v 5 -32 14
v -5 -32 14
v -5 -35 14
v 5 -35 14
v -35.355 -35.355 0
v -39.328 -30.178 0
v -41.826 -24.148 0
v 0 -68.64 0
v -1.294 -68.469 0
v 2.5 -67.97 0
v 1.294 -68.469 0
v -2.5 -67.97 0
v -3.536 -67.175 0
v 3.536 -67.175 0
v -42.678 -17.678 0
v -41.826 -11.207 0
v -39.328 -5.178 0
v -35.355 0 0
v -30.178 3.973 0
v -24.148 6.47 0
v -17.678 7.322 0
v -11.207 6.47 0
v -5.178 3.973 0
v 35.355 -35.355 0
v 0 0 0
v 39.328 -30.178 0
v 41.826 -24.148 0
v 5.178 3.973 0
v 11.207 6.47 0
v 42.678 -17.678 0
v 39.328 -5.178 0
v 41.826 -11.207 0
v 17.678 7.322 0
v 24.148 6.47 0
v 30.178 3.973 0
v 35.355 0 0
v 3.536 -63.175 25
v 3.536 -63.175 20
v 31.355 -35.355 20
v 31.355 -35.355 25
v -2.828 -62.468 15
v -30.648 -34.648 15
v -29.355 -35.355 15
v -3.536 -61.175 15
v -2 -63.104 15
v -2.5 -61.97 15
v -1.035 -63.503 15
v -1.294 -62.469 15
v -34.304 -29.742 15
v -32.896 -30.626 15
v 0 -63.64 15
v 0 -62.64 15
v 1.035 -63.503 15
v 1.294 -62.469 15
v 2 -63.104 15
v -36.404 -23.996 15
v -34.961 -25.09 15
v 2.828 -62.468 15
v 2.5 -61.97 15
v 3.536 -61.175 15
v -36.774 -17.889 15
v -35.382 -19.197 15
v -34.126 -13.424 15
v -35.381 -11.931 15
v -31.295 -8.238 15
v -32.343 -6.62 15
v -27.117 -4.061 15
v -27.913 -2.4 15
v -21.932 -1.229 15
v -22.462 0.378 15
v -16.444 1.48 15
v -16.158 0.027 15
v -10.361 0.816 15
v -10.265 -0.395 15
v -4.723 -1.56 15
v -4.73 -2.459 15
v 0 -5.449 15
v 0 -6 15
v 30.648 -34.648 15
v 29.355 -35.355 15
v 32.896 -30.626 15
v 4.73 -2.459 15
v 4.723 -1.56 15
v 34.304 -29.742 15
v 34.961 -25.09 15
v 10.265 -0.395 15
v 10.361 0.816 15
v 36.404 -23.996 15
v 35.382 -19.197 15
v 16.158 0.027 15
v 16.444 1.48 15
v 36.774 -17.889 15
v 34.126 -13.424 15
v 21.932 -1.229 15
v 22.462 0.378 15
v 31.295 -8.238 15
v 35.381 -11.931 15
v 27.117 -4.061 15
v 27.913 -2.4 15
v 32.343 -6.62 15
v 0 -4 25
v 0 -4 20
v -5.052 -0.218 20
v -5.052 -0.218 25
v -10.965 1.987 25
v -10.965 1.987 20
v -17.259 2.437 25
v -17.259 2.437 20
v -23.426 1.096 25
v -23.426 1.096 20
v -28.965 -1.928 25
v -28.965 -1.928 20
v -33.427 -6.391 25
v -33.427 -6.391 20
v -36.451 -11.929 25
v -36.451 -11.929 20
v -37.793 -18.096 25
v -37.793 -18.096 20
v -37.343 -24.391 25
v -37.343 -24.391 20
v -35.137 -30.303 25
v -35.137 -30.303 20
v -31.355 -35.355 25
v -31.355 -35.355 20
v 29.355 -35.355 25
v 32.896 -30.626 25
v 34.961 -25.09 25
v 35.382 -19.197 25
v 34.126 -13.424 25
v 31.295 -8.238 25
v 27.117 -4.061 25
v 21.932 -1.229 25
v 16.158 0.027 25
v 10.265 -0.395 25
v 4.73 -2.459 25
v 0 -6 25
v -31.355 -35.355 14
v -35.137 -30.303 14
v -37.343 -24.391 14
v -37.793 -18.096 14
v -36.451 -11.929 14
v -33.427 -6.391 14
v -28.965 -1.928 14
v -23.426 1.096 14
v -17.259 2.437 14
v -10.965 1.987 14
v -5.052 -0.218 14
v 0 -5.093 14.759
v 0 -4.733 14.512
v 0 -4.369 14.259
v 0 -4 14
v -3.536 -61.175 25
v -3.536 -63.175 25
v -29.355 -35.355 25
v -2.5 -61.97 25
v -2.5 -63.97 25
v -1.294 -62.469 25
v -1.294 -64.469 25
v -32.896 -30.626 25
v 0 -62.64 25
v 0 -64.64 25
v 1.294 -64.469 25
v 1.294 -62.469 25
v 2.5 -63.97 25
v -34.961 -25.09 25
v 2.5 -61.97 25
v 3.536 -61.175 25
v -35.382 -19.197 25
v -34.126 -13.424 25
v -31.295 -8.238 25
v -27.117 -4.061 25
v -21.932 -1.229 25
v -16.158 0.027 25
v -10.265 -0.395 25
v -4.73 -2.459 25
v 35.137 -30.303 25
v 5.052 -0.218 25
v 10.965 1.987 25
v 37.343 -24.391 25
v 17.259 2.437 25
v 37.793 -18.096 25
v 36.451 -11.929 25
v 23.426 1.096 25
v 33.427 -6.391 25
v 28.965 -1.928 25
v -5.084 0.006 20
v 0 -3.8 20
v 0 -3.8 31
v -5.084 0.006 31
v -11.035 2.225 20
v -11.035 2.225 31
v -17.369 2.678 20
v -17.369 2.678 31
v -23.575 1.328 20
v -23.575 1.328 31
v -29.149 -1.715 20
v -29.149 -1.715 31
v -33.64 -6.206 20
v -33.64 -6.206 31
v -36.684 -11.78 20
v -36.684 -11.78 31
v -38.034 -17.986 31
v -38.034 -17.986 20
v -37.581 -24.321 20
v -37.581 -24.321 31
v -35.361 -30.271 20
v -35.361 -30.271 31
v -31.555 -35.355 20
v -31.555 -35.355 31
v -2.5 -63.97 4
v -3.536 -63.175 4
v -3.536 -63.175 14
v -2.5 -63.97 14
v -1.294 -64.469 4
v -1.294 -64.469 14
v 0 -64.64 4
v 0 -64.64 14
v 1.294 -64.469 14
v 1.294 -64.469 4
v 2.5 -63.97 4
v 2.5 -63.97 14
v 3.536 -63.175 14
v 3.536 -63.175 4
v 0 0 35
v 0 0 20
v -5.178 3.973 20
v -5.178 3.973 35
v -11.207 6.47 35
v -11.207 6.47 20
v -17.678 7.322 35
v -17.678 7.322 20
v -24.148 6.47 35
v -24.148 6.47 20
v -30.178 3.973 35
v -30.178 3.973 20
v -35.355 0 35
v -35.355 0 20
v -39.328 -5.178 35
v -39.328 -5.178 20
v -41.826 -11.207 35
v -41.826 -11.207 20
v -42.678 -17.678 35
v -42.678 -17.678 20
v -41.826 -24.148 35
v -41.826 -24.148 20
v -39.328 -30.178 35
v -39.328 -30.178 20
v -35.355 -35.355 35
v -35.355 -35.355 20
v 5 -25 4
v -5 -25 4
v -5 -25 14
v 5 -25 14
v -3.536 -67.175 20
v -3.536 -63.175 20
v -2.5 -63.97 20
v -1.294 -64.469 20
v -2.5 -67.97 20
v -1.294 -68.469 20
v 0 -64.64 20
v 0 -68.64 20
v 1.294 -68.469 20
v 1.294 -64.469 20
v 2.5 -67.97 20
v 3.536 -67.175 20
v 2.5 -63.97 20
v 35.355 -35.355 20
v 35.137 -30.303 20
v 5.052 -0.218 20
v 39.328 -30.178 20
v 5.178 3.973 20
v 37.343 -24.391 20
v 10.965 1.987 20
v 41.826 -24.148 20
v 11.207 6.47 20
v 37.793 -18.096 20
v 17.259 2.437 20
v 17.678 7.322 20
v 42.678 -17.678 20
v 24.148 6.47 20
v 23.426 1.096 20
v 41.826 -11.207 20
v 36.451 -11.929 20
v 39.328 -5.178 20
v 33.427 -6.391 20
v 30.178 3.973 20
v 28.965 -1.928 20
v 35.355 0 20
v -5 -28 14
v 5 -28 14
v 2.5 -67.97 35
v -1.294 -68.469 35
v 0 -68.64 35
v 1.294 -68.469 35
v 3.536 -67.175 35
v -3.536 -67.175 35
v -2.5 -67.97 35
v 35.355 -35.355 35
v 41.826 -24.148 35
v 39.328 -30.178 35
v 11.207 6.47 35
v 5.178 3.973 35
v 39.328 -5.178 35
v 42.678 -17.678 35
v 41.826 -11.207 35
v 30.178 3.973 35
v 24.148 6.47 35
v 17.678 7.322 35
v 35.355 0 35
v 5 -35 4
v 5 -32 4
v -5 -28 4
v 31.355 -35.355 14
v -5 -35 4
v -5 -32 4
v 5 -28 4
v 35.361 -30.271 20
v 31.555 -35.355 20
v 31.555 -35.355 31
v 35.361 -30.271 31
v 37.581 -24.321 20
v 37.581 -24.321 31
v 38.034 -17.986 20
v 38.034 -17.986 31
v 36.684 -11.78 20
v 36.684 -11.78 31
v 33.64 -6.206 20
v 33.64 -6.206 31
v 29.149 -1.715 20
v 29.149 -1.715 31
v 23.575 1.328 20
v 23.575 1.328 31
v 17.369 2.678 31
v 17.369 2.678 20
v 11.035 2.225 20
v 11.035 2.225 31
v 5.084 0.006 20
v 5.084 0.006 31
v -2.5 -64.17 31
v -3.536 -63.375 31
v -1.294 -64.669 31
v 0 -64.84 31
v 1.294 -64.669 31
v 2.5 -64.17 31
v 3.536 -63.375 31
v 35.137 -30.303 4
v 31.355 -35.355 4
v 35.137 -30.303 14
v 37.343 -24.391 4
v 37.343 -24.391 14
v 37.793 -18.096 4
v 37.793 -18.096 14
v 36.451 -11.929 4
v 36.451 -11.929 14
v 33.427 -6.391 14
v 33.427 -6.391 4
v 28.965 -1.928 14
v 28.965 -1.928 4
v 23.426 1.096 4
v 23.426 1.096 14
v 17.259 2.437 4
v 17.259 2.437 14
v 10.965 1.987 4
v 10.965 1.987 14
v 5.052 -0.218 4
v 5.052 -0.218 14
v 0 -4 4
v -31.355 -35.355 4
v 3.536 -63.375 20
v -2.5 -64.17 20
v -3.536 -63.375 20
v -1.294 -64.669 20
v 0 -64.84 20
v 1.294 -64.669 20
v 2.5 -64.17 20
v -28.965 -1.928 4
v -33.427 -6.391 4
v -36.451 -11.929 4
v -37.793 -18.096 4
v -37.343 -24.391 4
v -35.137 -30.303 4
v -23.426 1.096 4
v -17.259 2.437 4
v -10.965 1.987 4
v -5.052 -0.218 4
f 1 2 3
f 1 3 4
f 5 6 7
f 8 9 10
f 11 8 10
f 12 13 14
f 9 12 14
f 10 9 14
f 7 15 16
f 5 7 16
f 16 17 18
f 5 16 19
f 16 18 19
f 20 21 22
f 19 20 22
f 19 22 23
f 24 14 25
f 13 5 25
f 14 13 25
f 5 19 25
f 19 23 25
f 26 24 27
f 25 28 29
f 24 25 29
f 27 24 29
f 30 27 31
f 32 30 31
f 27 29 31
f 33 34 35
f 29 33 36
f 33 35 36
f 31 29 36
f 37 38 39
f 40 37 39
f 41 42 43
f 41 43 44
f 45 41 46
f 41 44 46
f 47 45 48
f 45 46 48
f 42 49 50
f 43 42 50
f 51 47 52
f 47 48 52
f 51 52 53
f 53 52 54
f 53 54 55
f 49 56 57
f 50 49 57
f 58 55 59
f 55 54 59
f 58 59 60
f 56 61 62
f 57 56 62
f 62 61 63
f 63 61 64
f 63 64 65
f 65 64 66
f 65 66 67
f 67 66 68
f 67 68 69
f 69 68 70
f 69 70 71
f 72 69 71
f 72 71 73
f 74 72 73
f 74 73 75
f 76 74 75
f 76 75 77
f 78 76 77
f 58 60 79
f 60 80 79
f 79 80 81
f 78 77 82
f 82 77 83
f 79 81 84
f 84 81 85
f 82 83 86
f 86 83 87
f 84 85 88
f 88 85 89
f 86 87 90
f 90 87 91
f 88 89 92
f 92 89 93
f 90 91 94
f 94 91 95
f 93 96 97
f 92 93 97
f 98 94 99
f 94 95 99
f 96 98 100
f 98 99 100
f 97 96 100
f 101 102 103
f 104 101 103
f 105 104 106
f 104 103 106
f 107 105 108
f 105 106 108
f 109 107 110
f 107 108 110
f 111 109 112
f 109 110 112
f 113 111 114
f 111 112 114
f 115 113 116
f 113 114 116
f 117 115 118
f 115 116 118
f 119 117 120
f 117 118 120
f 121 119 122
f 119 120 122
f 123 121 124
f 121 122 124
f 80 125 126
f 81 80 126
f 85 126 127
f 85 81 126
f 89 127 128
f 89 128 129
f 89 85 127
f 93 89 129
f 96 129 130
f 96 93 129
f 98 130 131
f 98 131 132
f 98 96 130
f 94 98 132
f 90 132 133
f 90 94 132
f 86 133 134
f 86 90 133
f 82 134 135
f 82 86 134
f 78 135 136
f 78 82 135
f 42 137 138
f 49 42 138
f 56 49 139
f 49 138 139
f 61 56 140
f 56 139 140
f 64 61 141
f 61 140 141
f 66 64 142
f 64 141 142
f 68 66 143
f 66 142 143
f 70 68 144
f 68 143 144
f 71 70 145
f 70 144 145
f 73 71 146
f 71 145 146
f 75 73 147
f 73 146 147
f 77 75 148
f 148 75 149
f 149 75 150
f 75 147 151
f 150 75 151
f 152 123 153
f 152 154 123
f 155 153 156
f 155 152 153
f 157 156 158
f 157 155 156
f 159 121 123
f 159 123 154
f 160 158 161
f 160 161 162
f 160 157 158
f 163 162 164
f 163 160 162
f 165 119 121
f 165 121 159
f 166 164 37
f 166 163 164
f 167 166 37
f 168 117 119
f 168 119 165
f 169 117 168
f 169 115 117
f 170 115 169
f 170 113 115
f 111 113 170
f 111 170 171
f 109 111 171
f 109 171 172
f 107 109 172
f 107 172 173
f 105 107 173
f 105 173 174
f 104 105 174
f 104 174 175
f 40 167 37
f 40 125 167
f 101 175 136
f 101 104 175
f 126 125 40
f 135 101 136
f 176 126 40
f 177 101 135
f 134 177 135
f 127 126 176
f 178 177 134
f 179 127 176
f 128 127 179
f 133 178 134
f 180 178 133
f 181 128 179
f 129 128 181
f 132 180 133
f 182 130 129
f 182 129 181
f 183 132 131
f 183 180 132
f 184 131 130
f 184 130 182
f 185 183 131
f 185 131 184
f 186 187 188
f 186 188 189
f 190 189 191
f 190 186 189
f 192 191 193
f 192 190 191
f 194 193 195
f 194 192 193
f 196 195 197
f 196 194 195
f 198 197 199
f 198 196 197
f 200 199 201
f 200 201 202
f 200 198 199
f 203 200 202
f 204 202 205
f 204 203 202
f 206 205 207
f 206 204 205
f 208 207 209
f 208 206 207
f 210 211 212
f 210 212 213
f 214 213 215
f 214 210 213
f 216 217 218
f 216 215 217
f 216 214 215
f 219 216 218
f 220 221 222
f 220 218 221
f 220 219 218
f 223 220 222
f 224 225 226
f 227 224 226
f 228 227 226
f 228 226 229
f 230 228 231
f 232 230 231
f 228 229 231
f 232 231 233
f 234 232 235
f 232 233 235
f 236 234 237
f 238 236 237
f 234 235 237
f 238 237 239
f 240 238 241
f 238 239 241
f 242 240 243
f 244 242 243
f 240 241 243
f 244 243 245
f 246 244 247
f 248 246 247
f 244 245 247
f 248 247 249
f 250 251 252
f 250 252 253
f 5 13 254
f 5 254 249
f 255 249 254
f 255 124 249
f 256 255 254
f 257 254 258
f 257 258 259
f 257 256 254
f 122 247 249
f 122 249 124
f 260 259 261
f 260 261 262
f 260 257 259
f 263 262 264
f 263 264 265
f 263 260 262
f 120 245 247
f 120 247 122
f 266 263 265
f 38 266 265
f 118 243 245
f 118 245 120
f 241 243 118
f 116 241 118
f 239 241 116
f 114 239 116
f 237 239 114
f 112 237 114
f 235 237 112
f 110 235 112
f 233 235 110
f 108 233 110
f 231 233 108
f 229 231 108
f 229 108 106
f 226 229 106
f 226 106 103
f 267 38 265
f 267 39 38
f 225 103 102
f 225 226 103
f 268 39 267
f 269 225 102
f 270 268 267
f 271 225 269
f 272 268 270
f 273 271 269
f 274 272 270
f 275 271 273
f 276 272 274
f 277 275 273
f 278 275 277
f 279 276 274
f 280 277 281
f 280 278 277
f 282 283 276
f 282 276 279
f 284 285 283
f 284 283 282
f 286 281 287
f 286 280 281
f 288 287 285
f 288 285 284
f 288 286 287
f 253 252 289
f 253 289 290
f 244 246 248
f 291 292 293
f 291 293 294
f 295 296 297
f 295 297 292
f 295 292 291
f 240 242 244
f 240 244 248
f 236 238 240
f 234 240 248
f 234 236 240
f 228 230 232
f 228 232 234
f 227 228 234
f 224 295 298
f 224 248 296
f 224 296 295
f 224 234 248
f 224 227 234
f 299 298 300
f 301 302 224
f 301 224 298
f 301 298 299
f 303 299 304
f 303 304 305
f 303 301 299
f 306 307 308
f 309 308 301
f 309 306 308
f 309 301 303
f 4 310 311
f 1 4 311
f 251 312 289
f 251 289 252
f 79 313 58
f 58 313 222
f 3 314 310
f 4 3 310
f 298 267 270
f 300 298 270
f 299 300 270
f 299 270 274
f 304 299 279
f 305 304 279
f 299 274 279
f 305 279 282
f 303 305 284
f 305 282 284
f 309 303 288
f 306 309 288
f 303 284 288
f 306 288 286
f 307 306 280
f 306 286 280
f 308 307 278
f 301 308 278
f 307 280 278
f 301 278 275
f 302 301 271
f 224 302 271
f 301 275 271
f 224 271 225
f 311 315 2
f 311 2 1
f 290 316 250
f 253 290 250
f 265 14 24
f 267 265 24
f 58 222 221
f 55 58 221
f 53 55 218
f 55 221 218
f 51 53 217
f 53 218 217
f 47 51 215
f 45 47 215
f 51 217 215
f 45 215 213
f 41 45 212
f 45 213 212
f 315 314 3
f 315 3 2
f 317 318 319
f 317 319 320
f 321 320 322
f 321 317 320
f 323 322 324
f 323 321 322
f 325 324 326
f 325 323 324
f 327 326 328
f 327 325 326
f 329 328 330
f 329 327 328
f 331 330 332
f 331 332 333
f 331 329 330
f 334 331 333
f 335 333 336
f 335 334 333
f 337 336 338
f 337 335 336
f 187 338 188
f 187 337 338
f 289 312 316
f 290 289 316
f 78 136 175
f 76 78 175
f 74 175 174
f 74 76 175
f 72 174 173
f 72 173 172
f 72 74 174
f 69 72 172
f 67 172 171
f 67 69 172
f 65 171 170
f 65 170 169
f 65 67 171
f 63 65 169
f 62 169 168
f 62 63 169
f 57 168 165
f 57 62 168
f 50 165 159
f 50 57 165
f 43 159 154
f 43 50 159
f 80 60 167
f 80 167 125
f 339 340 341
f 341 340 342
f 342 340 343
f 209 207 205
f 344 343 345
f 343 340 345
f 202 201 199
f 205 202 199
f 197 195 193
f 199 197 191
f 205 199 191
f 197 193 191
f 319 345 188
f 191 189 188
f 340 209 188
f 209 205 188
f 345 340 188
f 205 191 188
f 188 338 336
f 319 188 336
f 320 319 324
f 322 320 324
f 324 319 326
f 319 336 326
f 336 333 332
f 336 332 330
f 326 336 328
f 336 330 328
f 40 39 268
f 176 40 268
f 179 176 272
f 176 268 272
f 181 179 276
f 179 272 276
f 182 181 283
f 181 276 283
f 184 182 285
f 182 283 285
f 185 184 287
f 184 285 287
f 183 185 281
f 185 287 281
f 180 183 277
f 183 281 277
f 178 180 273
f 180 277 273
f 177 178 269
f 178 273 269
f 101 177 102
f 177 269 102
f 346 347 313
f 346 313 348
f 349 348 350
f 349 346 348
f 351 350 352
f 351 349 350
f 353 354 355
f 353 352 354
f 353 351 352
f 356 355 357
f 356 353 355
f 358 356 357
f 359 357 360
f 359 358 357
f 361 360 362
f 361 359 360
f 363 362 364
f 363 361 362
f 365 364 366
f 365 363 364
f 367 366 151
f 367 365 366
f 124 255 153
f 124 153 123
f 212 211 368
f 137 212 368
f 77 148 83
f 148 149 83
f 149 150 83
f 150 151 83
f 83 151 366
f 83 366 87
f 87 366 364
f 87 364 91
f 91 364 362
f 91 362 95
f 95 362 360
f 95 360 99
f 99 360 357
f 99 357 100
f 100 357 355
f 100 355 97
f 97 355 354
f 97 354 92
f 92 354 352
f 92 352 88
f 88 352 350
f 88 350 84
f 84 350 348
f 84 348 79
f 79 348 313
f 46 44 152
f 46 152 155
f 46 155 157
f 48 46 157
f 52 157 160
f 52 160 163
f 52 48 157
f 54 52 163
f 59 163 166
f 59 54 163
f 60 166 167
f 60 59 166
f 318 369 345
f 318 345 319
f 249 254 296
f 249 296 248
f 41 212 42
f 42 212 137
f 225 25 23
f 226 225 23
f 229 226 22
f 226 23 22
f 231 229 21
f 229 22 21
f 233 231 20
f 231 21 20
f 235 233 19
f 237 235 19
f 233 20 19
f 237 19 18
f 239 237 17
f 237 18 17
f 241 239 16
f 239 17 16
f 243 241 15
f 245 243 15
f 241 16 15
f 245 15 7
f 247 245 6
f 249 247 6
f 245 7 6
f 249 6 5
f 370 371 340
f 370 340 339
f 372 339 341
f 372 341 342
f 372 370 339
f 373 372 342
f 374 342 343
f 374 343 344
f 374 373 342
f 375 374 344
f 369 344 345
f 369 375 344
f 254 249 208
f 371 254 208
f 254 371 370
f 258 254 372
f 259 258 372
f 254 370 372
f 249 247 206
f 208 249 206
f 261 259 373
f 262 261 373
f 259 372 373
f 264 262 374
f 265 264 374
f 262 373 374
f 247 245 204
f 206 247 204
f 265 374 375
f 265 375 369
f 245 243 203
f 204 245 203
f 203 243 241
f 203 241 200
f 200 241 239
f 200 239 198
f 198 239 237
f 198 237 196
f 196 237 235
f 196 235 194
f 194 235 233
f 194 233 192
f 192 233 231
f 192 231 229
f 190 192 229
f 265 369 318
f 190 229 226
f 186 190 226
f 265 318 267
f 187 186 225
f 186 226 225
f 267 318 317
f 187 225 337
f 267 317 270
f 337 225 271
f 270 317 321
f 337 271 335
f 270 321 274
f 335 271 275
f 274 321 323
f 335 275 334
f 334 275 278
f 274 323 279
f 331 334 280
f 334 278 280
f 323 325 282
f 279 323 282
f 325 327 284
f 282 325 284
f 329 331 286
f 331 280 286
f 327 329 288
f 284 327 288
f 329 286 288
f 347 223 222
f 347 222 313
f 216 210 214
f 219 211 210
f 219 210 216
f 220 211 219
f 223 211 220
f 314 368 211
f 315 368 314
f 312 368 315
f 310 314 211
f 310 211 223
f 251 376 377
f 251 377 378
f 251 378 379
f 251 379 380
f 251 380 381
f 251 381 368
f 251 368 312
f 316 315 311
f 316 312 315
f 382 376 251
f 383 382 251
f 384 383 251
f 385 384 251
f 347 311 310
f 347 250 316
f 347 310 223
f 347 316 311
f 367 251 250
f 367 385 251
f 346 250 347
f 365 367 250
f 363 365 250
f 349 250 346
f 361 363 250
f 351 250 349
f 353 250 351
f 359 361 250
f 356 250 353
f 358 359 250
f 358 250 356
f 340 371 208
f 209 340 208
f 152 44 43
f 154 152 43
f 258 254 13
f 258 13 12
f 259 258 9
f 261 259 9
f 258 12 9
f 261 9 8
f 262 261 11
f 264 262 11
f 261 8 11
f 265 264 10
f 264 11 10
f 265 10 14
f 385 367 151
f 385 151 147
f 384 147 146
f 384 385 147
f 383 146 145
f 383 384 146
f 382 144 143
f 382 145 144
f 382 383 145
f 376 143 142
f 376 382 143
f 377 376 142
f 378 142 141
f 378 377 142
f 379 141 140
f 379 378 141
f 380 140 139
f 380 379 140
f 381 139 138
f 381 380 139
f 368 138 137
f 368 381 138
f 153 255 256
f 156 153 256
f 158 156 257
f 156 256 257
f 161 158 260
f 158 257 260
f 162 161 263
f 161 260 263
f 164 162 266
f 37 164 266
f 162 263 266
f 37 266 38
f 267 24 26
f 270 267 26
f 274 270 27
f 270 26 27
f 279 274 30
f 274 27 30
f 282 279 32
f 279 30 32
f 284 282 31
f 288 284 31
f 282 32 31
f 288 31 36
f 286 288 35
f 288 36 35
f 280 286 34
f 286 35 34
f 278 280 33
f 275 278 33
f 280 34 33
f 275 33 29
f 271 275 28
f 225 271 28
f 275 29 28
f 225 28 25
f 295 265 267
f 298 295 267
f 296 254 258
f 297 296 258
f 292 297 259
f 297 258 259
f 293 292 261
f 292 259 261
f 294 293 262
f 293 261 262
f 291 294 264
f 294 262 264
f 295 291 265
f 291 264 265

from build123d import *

# Parameters (mm, degrees)
PAD_DEPTH       = 20
POCKET_DEPTH    = 16
PAD002_DEPTH    = 10
POCKET002_DEPTH = 10
SKETCH006_W     = 10
SKETCH006_H     = 3
PAD003_DEPTH    = 10
CHAMFER_SIZE    = 1
PAD001_DEPTH    = 15
POCKET001_DEPTH = 11


with BuildPart() as box_bottom_body:
    # Sketch → Pad (new body)
    with BuildSketch(Plane.XY):
        with BuildLine():
            ThreePointArc((-3.535534, -67.175144), (0, -68.63961), (3.535534, -67.175144))
            Line((3.535534, -67.175144), (35.355339, -35.355339))
            ThreePointArc((35.355339, -35.355339), (35.355339, 0), (0, 0))
            ThreePointArc((0, 0), (-35.355339, 0), (-35.355339, -35.355339))
            Line((-3.535534, -67.175144), (-35.355339, -35.355339))
        make_face()
    extrude(amount=PAD_DEPTH)

    # Sketch001 (on DatumPlane) → Pocket (cut)
    with BuildSketch(Plane.XY.offset(4)):
        with BuildLine():
            ThreePointArc((-3.535534, -63.175144), (0, -64.63961), (3.535534, -63.175144))
            Line((3.535534, -63.175144), (31.355339, -35.355339))
            ThreePointArc((31.355339, -35.355339), (31.355339, -4), (0, -4))
            ThreePointArc((0, -4), (-31.355339, -4), (-31.355339, -35.355339))
            Line((-3.535534, -63.175144), (-31.355339, -35.355339))
        make_face()
    extrude(amount=POCKET_DEPTH, mode=Mode.SUBTRACT)

    # Sketch004 (on DatumPlane) → Pad002 (join)
    with BuildSketch(Plane.XY.offset(15)):
        with BuildLine():
            ThreePointArc((-3.535534, -63.175144), (0, -64.63961), (3.535534, -63.175144))
            Line((3.535534, -63.175144), (31.355339, -35.355339))
            ThreePointArc((31.355339, -35.355339), (31.355339, -4), (0, -4))
            ThreePointArc((0, -4), (-31.355339, -4), (-31.355339, -35.355339))
            Line((-3.535534, -63.175144), (-31.355339, -35.355339))
        make_face()
    extrude(amount=PAD002_DEPTH)

    # Sketch005 (on DatumPlane) → Pocket002 (cut)
    with BuildSketch(Plane.XY.offset(15)):
        with BuildLine():
            ThreePointArc((-3.535534, -61.175144), (0, -62.63961), (3.535534, -61.175144))
            Line((3.535534, -61.175144), (29.355339, -35.355339))
            ThreePointArc((29.355339, -35.355339), (29.355339, -6), (0, -6))
            ThreePointArc((0, -6), (-29.355339, -6), (-29.355339, -35.355339))
            Line((-3.535534, -61.175144), (-29.355339, -35.355339))
        make_face()
    extrude(amount=POCKET002_DEPTH, mode=Mode.SUBTRACT)

    # Sketch006 (on DatumPlane) → Pad003 (join)
    with BuildSketch(Plane.XY.offset(4)):
        with Locations((0, -26.5)):
            Rectangle(SKETCH006_W, SKETCH006_H)
        with Locations((0, -33.5)):
            Rectangle(SKETCH006_W, SKETCH006_H)
    extrude(amount=PAD003_DEPTH)

    # Chamfer
    chamfer_edges = [box_bottom_body.edges().sort_by_distance(p)[0] for p in [
        (-17.445436, -49.265242, 15),
        (0, -64.63961, 15),
        (17.445436, -49.265242, 15),
        (31.355339, -4, 15),
        (-31.355339, -4, 15),
    ]]
    chamfer(chamfer_edges, length=CHAMFER_SIZE)


with BuildPart() as box_top_body:
    # Sketch002 (on DatumPlane) → Pad001 (new body)
    with BuildSketch(Plane.XY.offset(20)):
        with BuildLine():
            ThreePointArc((-3.535534, -67.175144), (0, -68.63961), (3.535534, -67.175144))
            Line((3.535534, -67.175144), (35.355339, -35.355339))
            ThreePointArc((35.355339, -35.355339), (35.355339, 0), (0, 0))
            ThreePointArc((0, 0), (-35.355339, 0), (-35.355339, -35.355339))
            Line((-3.535534, -67.175144), (-35.355339, -35.355339))
        make_face()
    extrude(amount=PAD001_DEPTH)

    # Sketch003 (on DatumPlane) → Pocket001 (cut)
    with BuildSketch(Plane.XY.offset(20)):
        with BuildLine():
            ThreePointArc((-3.535534, -63.375144), (0, -64.83961), (3.535534, -63.375144))
            Line((3.535534, -63.375144), (31.555339, -35.355339))
            ThreePointArc((31.555339, -35.355339), (31.555339, -3.8), (0, -3.8))
            ThreePointArc((0, -3.8), (-31.555339, -3.8), (-31.555339, -35.355339))
            Line((-3.535534, -63.375144), (-31.555339, -35.355339))
        make_face()
    extrude(amount=POCKET001_DEPTH, mode=Mode.SUBTRACT)


solid = Compound([box_bottom_body.part, box_top_body.part])
